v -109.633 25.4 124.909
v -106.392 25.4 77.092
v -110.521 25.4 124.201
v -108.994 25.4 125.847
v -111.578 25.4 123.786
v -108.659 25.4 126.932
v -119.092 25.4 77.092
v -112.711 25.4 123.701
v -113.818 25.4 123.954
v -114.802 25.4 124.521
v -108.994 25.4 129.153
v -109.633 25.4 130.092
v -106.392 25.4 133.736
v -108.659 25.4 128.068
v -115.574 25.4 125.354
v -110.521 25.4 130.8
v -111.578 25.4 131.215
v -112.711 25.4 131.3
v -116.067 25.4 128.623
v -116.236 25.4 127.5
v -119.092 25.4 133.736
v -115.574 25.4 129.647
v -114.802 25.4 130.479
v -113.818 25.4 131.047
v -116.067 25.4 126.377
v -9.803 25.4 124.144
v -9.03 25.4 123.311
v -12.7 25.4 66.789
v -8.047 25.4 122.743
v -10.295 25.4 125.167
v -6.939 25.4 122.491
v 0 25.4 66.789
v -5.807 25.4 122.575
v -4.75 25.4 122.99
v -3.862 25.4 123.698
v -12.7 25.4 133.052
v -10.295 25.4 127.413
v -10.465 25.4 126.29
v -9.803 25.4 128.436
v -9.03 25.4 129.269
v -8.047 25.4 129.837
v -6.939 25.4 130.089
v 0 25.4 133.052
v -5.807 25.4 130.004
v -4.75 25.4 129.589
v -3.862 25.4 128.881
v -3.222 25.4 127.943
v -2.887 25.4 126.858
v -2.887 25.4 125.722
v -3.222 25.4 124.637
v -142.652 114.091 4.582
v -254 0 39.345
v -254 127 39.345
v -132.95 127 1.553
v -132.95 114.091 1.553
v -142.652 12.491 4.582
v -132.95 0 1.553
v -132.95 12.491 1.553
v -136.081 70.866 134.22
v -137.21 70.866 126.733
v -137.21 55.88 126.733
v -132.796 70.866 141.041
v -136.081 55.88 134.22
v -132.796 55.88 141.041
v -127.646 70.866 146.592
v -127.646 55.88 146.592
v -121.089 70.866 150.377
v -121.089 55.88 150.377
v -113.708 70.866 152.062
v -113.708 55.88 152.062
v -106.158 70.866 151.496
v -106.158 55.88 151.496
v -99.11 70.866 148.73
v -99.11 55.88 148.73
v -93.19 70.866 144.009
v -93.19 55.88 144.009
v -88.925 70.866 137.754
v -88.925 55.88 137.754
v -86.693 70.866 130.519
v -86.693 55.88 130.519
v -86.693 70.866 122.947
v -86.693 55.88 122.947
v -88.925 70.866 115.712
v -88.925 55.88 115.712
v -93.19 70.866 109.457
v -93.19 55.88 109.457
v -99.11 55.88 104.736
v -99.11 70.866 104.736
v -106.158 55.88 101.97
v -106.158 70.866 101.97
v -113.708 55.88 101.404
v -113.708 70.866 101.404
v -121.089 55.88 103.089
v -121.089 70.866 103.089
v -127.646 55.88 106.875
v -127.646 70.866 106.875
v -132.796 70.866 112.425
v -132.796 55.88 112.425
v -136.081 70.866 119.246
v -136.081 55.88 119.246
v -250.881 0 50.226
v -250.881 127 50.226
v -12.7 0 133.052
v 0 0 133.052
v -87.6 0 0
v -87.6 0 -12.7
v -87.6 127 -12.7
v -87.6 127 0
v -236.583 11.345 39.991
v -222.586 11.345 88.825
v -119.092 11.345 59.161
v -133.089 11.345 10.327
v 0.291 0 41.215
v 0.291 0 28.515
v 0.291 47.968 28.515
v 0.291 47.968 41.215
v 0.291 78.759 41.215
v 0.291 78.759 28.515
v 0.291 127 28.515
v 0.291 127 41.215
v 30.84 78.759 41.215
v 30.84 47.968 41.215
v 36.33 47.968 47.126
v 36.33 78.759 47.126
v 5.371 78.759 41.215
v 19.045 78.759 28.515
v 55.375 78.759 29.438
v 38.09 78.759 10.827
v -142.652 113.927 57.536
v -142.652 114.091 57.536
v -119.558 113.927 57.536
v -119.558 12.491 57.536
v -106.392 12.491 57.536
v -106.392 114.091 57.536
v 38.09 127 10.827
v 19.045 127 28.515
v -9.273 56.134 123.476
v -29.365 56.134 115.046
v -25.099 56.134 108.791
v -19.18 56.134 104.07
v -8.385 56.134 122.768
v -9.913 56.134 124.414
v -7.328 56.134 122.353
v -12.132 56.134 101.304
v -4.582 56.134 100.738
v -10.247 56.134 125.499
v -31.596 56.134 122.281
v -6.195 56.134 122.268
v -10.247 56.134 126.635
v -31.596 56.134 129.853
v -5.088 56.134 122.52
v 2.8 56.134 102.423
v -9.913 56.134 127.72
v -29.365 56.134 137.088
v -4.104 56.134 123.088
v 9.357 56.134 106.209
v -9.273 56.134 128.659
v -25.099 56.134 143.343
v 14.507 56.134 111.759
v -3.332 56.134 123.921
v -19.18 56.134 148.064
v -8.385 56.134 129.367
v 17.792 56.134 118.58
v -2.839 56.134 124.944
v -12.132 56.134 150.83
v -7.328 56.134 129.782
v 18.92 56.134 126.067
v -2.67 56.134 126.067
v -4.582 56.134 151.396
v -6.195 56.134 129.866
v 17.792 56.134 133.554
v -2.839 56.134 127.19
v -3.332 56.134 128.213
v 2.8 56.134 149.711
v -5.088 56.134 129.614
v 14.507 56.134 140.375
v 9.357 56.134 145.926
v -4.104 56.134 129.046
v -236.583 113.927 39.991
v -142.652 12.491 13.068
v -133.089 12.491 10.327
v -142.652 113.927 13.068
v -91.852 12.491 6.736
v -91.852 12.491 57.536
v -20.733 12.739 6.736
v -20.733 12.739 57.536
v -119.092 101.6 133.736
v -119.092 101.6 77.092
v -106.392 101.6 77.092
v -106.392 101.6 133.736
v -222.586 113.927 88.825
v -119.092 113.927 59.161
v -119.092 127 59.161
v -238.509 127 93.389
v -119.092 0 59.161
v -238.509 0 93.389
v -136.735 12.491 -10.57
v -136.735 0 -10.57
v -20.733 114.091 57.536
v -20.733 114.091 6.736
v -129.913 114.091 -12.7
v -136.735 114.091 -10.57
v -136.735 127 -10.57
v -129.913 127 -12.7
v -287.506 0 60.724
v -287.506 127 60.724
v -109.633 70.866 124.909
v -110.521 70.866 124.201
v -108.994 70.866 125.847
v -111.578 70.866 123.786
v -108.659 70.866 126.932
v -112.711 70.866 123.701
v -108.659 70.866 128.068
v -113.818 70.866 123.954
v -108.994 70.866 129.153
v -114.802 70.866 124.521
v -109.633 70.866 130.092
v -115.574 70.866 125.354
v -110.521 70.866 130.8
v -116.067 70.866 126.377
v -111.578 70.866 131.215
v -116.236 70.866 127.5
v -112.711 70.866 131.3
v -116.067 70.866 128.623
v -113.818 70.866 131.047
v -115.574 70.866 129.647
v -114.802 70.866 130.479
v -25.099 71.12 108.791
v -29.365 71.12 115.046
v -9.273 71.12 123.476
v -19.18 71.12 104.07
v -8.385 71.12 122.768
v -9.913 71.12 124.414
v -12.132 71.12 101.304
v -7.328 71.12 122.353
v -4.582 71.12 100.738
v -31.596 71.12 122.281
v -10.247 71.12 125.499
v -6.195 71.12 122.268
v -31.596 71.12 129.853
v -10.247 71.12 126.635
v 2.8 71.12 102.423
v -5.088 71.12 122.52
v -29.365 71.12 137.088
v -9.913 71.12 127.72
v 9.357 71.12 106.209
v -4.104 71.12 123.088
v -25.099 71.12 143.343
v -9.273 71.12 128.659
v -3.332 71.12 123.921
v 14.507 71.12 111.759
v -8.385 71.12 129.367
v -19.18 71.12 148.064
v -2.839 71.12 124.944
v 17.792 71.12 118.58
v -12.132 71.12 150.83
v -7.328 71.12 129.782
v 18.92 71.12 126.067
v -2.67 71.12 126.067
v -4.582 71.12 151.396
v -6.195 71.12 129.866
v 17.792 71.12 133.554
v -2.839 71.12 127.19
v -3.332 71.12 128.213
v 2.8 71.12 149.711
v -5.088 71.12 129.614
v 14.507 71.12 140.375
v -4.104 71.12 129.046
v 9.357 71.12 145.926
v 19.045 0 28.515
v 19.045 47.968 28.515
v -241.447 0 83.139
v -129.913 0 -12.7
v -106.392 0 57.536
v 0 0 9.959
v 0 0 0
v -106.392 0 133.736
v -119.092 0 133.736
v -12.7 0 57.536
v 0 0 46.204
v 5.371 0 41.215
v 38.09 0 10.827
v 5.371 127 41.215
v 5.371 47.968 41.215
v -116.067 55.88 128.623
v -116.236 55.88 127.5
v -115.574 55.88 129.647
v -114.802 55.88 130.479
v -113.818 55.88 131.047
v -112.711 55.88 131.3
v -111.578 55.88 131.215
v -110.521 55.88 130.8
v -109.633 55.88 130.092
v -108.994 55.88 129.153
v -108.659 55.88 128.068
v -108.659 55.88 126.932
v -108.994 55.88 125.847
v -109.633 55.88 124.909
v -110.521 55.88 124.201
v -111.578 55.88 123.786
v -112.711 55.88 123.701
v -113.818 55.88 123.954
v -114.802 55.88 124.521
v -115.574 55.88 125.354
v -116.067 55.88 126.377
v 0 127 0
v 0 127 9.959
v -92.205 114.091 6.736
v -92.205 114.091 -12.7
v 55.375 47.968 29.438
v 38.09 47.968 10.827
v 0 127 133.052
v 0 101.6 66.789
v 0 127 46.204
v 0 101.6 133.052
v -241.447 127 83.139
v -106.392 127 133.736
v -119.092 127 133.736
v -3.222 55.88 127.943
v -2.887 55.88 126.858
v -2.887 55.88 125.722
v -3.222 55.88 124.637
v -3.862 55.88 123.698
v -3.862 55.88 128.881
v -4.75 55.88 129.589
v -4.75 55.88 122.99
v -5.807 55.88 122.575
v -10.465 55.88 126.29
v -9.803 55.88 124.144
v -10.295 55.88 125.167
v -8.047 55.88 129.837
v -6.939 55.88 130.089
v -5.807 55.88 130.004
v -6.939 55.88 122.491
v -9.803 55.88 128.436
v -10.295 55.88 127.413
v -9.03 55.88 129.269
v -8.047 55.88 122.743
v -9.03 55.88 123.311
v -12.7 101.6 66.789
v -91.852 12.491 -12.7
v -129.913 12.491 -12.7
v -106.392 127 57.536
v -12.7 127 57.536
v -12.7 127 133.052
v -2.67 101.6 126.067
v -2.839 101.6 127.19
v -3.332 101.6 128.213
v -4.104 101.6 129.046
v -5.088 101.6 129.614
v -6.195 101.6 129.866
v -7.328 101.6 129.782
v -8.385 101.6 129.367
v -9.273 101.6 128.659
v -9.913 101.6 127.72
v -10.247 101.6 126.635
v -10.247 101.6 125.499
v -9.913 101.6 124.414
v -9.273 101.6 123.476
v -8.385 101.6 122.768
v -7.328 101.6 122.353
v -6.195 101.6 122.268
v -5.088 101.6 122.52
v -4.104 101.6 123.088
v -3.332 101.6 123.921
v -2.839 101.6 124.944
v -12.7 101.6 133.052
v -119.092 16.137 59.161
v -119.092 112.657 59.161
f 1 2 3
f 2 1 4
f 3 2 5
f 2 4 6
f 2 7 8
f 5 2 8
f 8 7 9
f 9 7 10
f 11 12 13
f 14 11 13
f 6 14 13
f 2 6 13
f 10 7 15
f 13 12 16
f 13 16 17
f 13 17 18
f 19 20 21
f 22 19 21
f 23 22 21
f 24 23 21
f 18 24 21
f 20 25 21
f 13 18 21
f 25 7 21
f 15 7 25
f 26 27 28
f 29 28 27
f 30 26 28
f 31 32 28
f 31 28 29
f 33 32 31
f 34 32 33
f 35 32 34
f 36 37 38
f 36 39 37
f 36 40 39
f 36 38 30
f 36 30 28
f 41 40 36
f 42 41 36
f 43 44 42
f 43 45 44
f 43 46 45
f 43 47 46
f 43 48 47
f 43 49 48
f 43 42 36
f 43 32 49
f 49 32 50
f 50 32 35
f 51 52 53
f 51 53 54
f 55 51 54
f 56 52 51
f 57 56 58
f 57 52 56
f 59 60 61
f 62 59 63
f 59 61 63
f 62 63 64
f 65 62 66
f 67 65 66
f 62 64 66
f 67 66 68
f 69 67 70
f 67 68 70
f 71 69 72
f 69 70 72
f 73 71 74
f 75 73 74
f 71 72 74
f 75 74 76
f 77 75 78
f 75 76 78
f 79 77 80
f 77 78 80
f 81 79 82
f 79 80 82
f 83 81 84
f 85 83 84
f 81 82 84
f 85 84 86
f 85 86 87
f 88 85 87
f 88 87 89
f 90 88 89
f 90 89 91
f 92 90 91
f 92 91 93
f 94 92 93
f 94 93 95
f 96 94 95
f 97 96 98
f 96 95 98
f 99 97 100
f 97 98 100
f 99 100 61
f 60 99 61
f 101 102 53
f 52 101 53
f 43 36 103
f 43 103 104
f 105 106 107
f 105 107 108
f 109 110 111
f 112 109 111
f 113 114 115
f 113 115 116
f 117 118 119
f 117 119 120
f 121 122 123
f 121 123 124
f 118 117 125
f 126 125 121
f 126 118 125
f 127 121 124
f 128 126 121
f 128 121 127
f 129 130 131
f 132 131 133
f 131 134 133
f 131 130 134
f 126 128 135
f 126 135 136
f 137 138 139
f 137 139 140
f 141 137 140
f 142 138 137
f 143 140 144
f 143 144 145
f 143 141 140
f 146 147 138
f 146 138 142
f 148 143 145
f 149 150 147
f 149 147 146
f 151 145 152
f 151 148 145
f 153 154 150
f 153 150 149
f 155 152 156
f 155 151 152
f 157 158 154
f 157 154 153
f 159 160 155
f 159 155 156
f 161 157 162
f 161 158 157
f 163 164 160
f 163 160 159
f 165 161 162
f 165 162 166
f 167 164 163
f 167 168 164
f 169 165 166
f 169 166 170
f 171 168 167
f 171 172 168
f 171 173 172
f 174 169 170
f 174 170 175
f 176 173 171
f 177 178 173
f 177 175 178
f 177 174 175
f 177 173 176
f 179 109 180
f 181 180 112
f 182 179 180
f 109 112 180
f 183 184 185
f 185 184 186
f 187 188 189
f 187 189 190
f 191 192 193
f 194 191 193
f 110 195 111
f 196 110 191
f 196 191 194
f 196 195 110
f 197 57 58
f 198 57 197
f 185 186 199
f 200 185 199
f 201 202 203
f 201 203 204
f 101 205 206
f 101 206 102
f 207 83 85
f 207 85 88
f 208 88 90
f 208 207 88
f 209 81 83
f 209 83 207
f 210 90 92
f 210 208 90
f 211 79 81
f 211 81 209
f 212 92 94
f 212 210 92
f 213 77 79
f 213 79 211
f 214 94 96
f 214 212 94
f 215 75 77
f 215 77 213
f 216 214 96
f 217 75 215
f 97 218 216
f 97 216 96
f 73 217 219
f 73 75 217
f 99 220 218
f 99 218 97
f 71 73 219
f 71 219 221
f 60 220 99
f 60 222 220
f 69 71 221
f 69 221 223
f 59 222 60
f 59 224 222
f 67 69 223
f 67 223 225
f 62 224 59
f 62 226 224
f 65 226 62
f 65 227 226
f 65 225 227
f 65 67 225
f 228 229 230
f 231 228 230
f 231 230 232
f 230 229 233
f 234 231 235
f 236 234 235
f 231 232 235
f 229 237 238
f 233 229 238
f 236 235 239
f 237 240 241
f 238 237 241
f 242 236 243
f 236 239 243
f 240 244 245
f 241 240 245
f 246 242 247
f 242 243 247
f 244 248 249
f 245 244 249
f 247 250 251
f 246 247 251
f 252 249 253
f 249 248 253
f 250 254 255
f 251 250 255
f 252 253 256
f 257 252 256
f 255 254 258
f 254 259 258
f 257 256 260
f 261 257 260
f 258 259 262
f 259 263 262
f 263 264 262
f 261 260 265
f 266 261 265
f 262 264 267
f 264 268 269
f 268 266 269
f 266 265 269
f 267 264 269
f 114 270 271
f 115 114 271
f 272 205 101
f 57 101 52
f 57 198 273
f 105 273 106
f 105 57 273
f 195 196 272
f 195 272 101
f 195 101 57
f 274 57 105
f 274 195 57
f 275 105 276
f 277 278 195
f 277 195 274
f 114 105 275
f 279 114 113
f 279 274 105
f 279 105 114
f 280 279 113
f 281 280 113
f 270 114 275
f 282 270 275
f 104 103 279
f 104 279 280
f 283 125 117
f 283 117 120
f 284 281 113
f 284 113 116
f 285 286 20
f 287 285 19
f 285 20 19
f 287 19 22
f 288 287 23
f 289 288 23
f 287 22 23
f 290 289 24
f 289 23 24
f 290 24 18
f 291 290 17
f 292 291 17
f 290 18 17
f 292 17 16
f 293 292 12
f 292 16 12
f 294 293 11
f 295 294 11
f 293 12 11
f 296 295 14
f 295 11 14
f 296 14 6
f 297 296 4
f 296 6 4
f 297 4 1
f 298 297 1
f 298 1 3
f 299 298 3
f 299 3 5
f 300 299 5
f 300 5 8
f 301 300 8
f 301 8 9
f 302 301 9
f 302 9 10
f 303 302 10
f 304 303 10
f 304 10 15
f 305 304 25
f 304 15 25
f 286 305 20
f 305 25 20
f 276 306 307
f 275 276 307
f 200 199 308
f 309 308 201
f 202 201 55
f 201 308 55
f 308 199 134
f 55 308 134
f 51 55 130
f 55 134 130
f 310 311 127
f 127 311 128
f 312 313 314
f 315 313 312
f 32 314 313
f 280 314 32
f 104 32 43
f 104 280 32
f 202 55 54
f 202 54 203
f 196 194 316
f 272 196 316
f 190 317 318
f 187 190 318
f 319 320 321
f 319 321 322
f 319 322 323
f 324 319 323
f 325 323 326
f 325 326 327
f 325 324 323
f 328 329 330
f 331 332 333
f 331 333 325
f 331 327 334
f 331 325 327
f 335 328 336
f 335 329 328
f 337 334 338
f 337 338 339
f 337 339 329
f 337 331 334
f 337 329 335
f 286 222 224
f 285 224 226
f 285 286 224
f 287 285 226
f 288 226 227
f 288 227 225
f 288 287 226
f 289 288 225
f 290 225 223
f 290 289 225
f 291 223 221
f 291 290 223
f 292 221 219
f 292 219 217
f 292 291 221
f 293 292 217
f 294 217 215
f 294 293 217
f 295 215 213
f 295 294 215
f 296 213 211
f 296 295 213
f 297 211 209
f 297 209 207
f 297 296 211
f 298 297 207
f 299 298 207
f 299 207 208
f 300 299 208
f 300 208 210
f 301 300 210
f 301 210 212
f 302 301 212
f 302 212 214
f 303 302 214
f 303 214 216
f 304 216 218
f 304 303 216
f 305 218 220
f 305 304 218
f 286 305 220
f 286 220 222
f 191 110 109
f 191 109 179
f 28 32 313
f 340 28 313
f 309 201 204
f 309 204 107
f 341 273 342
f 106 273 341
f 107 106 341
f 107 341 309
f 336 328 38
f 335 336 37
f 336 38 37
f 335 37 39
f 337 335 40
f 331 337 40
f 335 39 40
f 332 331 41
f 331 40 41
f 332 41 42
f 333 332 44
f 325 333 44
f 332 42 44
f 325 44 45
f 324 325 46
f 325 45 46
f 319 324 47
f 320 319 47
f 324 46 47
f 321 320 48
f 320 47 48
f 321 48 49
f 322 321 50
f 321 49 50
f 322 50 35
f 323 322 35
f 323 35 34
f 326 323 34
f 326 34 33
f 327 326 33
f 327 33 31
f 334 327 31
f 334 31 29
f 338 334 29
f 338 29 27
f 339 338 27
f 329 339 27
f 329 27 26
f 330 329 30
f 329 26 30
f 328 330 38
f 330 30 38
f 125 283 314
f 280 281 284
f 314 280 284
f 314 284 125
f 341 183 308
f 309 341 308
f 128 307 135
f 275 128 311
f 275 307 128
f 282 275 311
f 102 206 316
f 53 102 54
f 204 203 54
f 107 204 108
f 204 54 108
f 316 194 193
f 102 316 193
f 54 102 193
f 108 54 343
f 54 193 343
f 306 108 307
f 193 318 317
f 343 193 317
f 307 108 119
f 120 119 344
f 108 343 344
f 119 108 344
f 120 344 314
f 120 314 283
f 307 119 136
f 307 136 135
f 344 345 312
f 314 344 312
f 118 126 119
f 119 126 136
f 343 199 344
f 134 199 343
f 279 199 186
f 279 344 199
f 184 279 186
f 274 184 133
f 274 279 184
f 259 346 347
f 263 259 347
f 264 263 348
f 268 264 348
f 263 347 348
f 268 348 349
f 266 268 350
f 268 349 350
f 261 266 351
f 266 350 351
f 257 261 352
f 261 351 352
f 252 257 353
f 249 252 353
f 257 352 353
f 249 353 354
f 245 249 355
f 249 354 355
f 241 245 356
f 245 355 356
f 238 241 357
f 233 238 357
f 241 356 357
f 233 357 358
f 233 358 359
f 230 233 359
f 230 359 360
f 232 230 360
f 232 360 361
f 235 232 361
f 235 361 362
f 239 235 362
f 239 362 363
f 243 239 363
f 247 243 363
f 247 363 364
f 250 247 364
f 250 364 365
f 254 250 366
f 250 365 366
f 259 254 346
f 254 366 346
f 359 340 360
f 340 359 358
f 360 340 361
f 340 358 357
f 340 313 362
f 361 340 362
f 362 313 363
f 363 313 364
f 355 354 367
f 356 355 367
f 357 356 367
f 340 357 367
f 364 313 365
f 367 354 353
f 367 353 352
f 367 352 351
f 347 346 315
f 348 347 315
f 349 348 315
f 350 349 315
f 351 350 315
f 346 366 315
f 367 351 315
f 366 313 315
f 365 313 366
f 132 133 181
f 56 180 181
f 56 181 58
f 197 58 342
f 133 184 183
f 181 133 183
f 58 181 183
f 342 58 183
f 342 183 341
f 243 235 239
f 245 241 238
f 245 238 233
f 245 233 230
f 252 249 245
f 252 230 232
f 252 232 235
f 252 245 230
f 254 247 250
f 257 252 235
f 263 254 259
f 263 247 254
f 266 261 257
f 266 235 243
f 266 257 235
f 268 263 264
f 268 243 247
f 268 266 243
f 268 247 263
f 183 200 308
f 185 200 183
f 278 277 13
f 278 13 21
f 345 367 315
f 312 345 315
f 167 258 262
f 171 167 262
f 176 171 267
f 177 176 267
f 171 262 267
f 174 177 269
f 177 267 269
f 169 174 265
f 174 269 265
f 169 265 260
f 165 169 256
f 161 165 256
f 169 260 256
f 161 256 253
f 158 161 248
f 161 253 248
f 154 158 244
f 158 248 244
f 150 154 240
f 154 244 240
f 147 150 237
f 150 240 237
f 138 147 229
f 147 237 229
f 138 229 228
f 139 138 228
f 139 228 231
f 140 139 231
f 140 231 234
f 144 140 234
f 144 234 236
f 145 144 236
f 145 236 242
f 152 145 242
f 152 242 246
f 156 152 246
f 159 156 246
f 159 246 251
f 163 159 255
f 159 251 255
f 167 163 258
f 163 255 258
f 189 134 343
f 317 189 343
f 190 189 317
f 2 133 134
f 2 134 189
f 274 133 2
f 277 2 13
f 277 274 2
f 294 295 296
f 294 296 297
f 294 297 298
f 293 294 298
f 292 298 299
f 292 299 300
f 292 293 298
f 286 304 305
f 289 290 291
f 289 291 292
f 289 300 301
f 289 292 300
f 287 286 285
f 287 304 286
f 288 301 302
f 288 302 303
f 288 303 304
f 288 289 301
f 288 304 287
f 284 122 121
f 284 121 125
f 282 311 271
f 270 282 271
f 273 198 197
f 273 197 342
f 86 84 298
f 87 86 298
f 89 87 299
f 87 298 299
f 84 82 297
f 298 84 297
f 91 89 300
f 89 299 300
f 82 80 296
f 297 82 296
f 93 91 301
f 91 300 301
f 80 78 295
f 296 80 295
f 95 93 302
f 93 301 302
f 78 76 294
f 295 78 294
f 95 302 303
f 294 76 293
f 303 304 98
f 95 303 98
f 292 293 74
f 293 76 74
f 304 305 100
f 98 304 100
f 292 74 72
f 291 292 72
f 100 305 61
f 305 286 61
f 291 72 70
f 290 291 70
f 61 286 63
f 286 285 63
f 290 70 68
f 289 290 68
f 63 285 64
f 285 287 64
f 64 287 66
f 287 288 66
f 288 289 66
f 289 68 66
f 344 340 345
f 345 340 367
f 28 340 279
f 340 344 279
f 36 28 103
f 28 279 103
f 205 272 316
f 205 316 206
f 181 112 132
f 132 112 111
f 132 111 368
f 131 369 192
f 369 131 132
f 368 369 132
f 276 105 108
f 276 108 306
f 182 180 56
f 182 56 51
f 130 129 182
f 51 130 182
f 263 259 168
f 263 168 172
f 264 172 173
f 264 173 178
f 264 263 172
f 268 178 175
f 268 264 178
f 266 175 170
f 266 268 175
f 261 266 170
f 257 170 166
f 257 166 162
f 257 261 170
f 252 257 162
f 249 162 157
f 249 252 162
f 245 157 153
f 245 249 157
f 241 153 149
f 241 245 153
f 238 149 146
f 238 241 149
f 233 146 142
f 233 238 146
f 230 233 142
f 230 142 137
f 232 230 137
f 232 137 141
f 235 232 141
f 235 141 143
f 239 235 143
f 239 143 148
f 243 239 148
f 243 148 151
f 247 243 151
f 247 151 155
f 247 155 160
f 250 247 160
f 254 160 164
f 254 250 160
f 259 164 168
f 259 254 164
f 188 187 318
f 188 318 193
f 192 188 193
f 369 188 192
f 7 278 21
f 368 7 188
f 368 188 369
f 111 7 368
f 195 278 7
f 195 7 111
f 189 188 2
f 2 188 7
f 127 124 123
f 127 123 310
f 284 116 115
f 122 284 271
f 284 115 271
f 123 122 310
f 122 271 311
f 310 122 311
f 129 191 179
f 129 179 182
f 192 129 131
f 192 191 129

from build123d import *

# Parameters (mm, degrees)
F0_W      = 12.7
F0_H      = 75.5161463809
F1_DEPTH  = 127
F2_W      = 76.2
F2_H      = 66.2636627701
F3_DEPTH  = 25.4
F4_W      = 76.2
F4_H      = 56.6441606358
F5_DEPTH  = 25.4
F7_DEPTH  = 50.8
F8_W      = 91.44
F8_H      = 96.52
F9_DEPTH  = 50.8
F10_DEPTH = 50.8
F11_DEPTH = 25.4
F12_W     = 16.2214900825
F12_H     = 96.52
F13_DEPTH = 25.4
F14_W     = 107.6614900825
F14_H     = 4.7919526836
F15_DEPTH = 50.8
F16_W     = 107.6614900825
F16_H     = 1.27
F17_DEPTH = 50.8
F18_W     = 25.4
F18_H     = 101.6
F19_DEPTH = 50.8
F21_DEPTH = 50.8
F22_W     = 25.9920891664
F22_H     = 30.7906605303
F23_DEPTH = 50.8
F24_DEPTH = 43.18
F25_DEPTH = 25.4
F26_R     = 3.81
F27_DEPTH = 30.48
F28_R     = 3.81
F29_DEPTH = 30.48
F30_R     = 25.4
F30_R_2   = 3.81
F31_DEPTH = 14.986
F34_R     = 3.81
F35_DEPTH = 30.48
F36_R     = 25.4
F36_R_2   = 3.81
F37_DEPTH = 14.986


# Not quite as in the source:
# - the program builds the solid bodies; features that only make, move or delete a surface that nothing else refers to are left out


with BuildPart() as f1:
    # F0 (on Front) → F1 (new body)
    with BuildSketch(Plane.XZ):
        Polygon((-87.5999455111, 0), (0, 0), (0, 9.9594512863), (0, 46.2035047115), (0, 57.53631645), (-12.7, 57.53631645), (-106.3919453168, 57.53631645), (-113.4251185967, 57.53631645), (-119.0919453168, 59.1605978149), (-238.5092618621, 93.3891584363), (-241.4471621132, 83.1393507349), (-250.8809689206, 50.2264886893), (-254, 39.3447479744), (-132.9504583663, 1.5528194825), (-127.9766956054, 0), align=None)
        Polygon((-287.50616107, 60.7243599029), (-250.8809689206, 50.2264886893), (-241.4471621132, 83.1393507349), align=None)
        Polygon((-87.5999455111, -12.7), (-87.5999455111, 0), (-127.9766956054, 0), (-132.9504583663, 1.5528194825), (-136.7352611956, -10.5701037435), (-129.9130910692, -12.7), align=None)
        Polygon((-113.4251185967, 57.53631645), (-106.3919453168, 57.53631645), (-106.3919453168, 133.73631645), (-119.0919453168, 133.73631645), (-119.0919453168, 59.1605978149), align=None)
        with Locations((-6.35, 95.2943896404)):
            Rectangle(F0_W, F0_H)
        Polygon((43.4708868936, 41.215249927), (5.3708868936, 41.215249927), (19.0450608273, 28.515249927), (43.4708868936, 28.515249927), align=None)
        Polygon((0, 46.2035047115), (0, 9.9594512863), (38.0901216545, 10.8269951425), (19.0450608273, 28.515249927), (5.3708868936, 41.215249927), align=None)
    extrude(amount=-F1_DEPTH)

    # F2 (on face) → F3 (cut)
    with BuildSketch(Plane.YZ):
        with Locations((63.5, 99.9206314458)):
            Rectangle(F2_W, F2_H)
    extrude(amount=-F3_DEPTH, mode=Mode.SUBTRACT)

    # F4 (on face) → F5 (cut)
    with BuildSketch(Plane(origin=(-119.0919453168, 0, 0), x_dir=(0, -1, 0), z_dir=(-1, 0, 0))):
        with Locations((-63.5, 105.4142361321)):
            Rectangle(F4_W, F4_H)
    extrude(amount=-F5_DEPTH, mode=Mode.SUBTRACT)

    # F6 (on face) → F7 (cut)
    with BuildSketch(Plane.XY.offset(57.53631645)):
        Polygon((-20.7326539246, 114.0913581697), (-91.852224491, 114.0913581697), (-91.852224491, 12.4913581697), (-20.7326539246, 12.7385068121), align=None)
    extrude(amount=-F7_DEPTH, mode=Mode.SUBTRACT)

    # F8 (on face) → F9 (cut)
    with BuildSketch(Plane(origin=(6.6284267866, 0, 23.125393689), x_dir=(0.9612911325, 0, -0.2755346775), z_dir=(0.2755346775, 0, 0.9612911325))):
        with Locations((-192.7243173122, 64.3972861033)):
            Rectangle(F8_W, F8_H)
    extrude(amount=-F9_DEPTH, mode=Mode.SUBTRACT)

    # F10 (cut): a face of the model
    f10_faces = [f1.faces().sort_by_distance(p)[0] for p in [
        (-91.852224491, 63.2913581697, 32.13631645),
    ]]
    extrude(f10_faces, amount=-F10_DEPTH, mode=Mode.SUBTRACT)

    # F11 (cut): a face of the model
    f11_faces = [f1.faces().sort_by_distance(p)[0] for p in [
        (-145.6674529992, 64.3972861033, 25.3161834597),
    ]]
    extrude(f11_faces, amount=-F11_DEPTH, mode=Mode.SUBTRACT)

    # F12 (on face) → F13 (cut)
    with BuildSketch(Plane(origin=(6.6284267866, 0, 23.125393689), x_dir=(0.9612911325, 0, -0.2755346775), z_dir=(0.2755346775, 0, 0.9612911325))):
        with Locations((-138.893572271, 64.3972861033)):
            Rectangle(F12_W, F12_H)
    extrude(amount=-F13_DEPTH, mode=Mode.SUBTRACT)

    # F14 (on face) → F15 (cut)
    with BuildSketch(Plane(origin=(6.6284267866, 0, 23.125393689), x_dir=(0.9612911325, 0, -0.2755346775), z_dir=(0.2755346775, 0, 0.9612911325))):
        with Locations((-184.613572271, 13.7413097615)):
            Rectangle(F14_W, F14_H)
    extrude(amount=-F15_DEPTH, mode=Mode.SUBTRACT)

    # F16 (on face) → F17 (cut)
    with BuildSketch(Plane(origin=(6.6284267866, 0, 23.125393689), x_dir=(0.9612911325, 0, -0.2755346775), z_dir=(0.2755346775, 0, 0.9612911325))):
        with Locations((-184.613572271, 113.2922861033)):
            Rectangle(F16_W, F16_H)
    extrude(amount=-F17_DEPTH, mode=Mode.SUBTRACT)

    # F18 (on face) → F19 (cut)
    with BuildSketch(Plane.XY.offset(6.73631645)):
        with Locations((-129.952224491, 63.2913581697)):
            Rectangle(F18_W, F18_H)
    extrude(amount=-F19_DEPTH, mode=Mode.SUBTRACT)

    # F20 (on face) → F21 (cut)
    with BuildSketch(Plane.XY.offset(6.73631645)):
        Polygon((-117.252224491, 12.4913581697), (-104.552224491, 12.4913581697), (-91.852224491, 12.4913581697), (-92.2052961121, 114.0913581697), (-117.252224491, 114.0913581697), align=None)
    extrude(amount=-F21_DEPTH, mode=Mode.SUBTRACT)

    # F22 (on face) → F23 (join)
    with BuildSketch(Plane(origin=(23.0388020149, 0, 24.8060303918), x_dir=(0.7327252806, 0, -0.68052455), z_dir=(0.68052455, 0, 0.7327252806))):
        with Locations((7.5455144958, 63.3634831756)):
            Rectangle(F22_W, F22_H)
    extrude(amount=F23_DEPTH)

    # F24 (cut): faces of the model
    f24_faces = [f1.faces().sort_by_distance(p)[0] for p in [
        (43.4708868936, 23.9840764552, 34.865249927),
        (43.4708868936, 102.8794067204, 34.865249927),
    ]]
    extrude(f24_faces, amount=-F24_DEPTH, mode=Mode.SUBTRACT)

    # F25 (cut): a face of the model
    f25_faces = [f1.faces().sort_by_distance(p)[0] for p in [
        (63.1382383827, 63.3634831756, 56.8935667881),
    ]]
    extrude(f25_faces, amount=-F25_DEPTH, mode=Mode.SUBTRACT)

    # F26 (on face) → F27 (join)
    with BuildSketch(Plane.XZ.offset(-101.6)):
        with Locations((-6.4799388689, 126.0670712375)):
            Circle(F26_R)
    extrude(amount=F27_DEPTH)

    # F28 (on face) → F29 (join)
    with BuildSketch(Plane(origin=(0, 25.4, 0), x_dir=(-1, 0, 0), z_dir=(0, 1, 0))):
        with Locations((6.6545831251, 126.2898803812)):
            Circle(F28_R)
    extrude(amount=F29_DEPTH)

    # F34 (on face) → F35 (join)
    with BuildSketch(Plane(origin=(0, 25.4, 0), x_dir=(-1, 0, 0), z_dir=(0, 1, 0))):
        with Locations((112.426199019, 127.5002658367)):
            Circle(F34_R)
    extrude(amount=F35_DEPTH)


with BuildPart() as f31:
    # F30 (on face) → F31 (new body)
    with BuildSketch(Plane.XZ.offset(-71.12)):
        with Locations((-6.4799388689, 126.0670712375)):
            Circle(F30_R)
        with Locations((-6.4799388689, 126.0670712375)):
            Circle(F30_R_2, mode=Mode.SUBTRACT)
    extrude(amount=F31_DEPTH)


with BuildPart() as f37:
    # F36 (on face) → F37 (new body)
    with BuildSketch(Plane(origin=(0, 55.88, 0), x_dir=(-1, 0, 0), z_dir=(0, 1, 0))):
        with Locations((111.809797585, 126.7330497503)):
            Circle(F36_R)
        with Locations((112.426199019, 127.5002658367)):
            Circle(F36_R_2, mode=Mode.SUBTRACT)
    extrude(amount=F37_DEPTH)


solid = Compound([f1.part, f31.part, f37.part])
